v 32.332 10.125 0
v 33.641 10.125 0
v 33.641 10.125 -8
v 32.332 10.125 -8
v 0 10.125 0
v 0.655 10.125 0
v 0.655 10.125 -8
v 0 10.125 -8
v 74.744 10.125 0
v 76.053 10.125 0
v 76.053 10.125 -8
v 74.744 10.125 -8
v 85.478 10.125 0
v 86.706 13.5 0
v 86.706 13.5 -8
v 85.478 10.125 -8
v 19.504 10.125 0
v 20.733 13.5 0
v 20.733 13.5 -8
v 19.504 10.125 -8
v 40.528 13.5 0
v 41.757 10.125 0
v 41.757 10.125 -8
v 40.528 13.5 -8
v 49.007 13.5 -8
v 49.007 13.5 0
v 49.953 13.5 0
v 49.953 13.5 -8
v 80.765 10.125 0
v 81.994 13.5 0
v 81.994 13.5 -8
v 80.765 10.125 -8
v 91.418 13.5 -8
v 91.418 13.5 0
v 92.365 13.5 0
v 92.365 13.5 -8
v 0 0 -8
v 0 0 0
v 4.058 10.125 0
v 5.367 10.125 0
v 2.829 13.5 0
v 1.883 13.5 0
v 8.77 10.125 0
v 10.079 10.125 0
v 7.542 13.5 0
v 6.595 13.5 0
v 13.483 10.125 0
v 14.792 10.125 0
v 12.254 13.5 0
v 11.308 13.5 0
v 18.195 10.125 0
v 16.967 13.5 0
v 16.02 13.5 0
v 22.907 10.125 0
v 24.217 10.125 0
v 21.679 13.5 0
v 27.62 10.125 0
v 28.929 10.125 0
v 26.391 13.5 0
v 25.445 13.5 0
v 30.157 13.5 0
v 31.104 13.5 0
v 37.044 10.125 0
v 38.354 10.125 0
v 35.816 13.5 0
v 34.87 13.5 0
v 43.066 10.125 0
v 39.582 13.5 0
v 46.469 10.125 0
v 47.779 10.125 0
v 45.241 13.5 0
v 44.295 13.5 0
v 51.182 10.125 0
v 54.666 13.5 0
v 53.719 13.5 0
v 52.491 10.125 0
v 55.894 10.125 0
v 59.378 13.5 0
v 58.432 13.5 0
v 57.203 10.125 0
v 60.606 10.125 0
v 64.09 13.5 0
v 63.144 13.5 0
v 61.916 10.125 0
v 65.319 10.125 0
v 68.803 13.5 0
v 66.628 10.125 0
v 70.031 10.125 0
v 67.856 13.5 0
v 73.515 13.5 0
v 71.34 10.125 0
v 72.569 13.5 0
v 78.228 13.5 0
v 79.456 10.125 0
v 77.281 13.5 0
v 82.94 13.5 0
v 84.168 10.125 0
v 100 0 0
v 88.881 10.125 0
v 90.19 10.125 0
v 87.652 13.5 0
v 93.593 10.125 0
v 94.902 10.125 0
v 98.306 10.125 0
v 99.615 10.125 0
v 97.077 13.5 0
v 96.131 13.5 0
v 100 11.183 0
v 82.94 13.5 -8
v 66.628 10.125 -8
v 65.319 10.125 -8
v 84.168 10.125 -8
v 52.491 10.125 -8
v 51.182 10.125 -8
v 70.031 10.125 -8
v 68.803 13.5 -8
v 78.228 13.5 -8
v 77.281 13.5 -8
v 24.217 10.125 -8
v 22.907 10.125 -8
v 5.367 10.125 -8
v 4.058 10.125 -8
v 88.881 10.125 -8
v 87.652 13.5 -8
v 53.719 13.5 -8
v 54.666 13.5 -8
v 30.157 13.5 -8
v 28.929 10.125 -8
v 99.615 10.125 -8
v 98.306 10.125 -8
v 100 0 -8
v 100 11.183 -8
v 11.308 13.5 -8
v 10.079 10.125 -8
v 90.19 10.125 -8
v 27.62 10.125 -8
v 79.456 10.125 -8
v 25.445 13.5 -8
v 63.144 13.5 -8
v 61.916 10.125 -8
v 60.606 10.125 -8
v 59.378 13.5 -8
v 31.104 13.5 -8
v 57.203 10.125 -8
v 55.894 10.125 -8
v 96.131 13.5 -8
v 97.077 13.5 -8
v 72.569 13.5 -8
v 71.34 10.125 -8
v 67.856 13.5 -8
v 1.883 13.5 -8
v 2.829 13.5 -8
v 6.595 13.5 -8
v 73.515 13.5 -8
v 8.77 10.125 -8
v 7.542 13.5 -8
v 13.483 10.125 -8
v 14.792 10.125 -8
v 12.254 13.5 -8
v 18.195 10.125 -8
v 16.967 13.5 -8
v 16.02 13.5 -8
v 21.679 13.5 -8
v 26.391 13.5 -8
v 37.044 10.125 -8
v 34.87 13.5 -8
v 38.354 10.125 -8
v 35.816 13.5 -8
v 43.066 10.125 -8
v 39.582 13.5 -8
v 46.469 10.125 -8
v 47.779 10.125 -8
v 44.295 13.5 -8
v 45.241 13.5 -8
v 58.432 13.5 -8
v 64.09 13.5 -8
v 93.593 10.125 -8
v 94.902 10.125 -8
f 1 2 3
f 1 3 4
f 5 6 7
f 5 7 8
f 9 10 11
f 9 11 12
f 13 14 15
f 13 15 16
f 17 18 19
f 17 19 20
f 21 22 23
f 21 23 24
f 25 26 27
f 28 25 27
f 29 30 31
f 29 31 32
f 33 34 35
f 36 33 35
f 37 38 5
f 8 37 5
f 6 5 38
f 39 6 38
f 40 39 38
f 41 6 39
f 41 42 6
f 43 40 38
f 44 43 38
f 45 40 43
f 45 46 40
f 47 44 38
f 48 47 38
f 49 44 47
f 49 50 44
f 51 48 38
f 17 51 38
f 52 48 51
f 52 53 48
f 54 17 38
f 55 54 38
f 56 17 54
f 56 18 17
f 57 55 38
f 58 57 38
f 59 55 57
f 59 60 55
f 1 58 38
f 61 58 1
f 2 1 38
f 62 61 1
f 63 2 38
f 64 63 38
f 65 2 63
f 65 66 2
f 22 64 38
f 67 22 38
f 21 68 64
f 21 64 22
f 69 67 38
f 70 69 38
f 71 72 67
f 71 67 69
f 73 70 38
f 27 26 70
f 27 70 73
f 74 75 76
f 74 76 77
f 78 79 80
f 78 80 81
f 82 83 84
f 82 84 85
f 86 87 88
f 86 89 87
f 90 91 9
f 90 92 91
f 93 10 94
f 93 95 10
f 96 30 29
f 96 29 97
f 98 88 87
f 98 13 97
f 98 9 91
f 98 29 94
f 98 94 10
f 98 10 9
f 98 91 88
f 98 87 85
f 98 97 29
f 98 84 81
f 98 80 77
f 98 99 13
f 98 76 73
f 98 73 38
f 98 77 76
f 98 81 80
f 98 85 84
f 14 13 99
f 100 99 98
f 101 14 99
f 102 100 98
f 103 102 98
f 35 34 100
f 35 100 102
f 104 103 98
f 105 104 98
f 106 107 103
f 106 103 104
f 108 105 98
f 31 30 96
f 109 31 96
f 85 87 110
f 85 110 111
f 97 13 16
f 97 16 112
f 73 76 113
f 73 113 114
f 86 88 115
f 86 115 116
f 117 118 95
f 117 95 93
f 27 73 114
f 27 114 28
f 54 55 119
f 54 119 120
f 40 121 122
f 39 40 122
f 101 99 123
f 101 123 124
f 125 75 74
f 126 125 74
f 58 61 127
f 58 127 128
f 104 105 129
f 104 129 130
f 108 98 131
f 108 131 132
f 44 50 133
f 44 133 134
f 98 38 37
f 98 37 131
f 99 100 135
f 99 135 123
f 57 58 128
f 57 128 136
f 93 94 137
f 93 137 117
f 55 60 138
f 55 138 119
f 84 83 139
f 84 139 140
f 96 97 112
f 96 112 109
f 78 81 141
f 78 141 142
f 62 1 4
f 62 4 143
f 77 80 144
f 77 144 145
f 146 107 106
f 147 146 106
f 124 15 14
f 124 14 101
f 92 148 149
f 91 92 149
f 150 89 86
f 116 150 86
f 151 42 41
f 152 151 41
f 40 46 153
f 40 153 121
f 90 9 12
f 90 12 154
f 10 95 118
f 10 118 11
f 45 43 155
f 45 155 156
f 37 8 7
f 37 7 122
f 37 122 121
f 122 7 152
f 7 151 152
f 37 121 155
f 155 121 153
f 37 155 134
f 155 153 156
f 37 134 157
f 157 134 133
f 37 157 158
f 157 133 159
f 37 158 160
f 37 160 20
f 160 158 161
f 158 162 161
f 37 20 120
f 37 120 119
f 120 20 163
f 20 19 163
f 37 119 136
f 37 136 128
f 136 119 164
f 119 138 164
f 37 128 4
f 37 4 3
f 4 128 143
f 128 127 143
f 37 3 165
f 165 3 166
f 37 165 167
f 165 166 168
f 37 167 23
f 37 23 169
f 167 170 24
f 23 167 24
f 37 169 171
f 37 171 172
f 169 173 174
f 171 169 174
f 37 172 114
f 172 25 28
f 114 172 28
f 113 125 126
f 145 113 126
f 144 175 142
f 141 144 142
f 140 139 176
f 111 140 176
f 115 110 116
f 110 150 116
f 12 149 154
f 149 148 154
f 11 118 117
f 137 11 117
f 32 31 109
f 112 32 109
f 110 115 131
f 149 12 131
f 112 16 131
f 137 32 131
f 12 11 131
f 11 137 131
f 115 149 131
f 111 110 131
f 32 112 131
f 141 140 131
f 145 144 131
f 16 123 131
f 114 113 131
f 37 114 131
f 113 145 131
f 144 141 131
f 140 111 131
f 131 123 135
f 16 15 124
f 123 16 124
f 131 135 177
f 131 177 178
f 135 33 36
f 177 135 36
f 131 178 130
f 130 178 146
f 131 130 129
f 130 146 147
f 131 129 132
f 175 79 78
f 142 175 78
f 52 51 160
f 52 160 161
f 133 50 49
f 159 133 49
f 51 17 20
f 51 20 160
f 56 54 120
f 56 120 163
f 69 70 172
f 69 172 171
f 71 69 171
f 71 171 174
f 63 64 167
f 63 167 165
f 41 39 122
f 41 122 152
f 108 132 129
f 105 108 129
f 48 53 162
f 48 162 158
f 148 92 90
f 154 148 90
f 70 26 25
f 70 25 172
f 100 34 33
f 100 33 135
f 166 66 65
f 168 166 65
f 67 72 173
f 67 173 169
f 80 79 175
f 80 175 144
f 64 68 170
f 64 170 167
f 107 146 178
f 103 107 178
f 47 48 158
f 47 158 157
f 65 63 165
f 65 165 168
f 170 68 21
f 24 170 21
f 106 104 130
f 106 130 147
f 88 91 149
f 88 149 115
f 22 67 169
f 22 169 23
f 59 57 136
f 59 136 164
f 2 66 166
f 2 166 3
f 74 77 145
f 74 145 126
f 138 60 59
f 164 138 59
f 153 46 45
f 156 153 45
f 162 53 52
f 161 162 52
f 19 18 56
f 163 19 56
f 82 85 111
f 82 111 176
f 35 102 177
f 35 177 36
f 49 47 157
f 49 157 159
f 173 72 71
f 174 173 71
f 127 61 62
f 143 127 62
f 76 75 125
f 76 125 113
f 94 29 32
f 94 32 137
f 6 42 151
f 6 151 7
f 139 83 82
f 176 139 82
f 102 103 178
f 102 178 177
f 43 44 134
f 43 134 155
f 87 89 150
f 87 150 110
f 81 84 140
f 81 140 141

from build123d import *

# Parameters (mm, degrees)
BLANKSKE_W        = 100
BLANKSKE_H        = 13.5
BLANK_DEPTH       = 8
TOOTHCUTSIM_DEPTH = 102.223762032
TEETHCUTS_COUNT   = 22
TEETHCUTS_PITCH   = 4.712388975


with BuildPart() as part:
    # BlankSke → Blank (new body)
    with BuildSketch(Plane.XY):
        with Locations((50, 6.75)):
            Rectangle(BLANKSKE_W, BLANKSKE_H)
    extrude(amount=-BLANK_DEPTH)

    # TooCutSkeSim → ToothCutSim (cut, through all)
    with BuildSketch(Plane.XY):
        Polygon((0.654653055, 10.125), (-0.654653055, 10.125), (-1.892297439, 13.5254), (1.892297439, 13.5254), align=None)
    toothcutsim = extrude(amount=-TOOTHCUTSIM_DEPTH, mode=Mode.SUBTRACT)

    # TeethCuts: ToothCutSim ×22
    with Locations(*[(i * TEETHCUTS_PITCH, 0, 0) for i in range(1, TEETHCUTS_COUNT)]):
        add(toothcutsim, mode=Mode.SUBTRACT)


solid = part.part
